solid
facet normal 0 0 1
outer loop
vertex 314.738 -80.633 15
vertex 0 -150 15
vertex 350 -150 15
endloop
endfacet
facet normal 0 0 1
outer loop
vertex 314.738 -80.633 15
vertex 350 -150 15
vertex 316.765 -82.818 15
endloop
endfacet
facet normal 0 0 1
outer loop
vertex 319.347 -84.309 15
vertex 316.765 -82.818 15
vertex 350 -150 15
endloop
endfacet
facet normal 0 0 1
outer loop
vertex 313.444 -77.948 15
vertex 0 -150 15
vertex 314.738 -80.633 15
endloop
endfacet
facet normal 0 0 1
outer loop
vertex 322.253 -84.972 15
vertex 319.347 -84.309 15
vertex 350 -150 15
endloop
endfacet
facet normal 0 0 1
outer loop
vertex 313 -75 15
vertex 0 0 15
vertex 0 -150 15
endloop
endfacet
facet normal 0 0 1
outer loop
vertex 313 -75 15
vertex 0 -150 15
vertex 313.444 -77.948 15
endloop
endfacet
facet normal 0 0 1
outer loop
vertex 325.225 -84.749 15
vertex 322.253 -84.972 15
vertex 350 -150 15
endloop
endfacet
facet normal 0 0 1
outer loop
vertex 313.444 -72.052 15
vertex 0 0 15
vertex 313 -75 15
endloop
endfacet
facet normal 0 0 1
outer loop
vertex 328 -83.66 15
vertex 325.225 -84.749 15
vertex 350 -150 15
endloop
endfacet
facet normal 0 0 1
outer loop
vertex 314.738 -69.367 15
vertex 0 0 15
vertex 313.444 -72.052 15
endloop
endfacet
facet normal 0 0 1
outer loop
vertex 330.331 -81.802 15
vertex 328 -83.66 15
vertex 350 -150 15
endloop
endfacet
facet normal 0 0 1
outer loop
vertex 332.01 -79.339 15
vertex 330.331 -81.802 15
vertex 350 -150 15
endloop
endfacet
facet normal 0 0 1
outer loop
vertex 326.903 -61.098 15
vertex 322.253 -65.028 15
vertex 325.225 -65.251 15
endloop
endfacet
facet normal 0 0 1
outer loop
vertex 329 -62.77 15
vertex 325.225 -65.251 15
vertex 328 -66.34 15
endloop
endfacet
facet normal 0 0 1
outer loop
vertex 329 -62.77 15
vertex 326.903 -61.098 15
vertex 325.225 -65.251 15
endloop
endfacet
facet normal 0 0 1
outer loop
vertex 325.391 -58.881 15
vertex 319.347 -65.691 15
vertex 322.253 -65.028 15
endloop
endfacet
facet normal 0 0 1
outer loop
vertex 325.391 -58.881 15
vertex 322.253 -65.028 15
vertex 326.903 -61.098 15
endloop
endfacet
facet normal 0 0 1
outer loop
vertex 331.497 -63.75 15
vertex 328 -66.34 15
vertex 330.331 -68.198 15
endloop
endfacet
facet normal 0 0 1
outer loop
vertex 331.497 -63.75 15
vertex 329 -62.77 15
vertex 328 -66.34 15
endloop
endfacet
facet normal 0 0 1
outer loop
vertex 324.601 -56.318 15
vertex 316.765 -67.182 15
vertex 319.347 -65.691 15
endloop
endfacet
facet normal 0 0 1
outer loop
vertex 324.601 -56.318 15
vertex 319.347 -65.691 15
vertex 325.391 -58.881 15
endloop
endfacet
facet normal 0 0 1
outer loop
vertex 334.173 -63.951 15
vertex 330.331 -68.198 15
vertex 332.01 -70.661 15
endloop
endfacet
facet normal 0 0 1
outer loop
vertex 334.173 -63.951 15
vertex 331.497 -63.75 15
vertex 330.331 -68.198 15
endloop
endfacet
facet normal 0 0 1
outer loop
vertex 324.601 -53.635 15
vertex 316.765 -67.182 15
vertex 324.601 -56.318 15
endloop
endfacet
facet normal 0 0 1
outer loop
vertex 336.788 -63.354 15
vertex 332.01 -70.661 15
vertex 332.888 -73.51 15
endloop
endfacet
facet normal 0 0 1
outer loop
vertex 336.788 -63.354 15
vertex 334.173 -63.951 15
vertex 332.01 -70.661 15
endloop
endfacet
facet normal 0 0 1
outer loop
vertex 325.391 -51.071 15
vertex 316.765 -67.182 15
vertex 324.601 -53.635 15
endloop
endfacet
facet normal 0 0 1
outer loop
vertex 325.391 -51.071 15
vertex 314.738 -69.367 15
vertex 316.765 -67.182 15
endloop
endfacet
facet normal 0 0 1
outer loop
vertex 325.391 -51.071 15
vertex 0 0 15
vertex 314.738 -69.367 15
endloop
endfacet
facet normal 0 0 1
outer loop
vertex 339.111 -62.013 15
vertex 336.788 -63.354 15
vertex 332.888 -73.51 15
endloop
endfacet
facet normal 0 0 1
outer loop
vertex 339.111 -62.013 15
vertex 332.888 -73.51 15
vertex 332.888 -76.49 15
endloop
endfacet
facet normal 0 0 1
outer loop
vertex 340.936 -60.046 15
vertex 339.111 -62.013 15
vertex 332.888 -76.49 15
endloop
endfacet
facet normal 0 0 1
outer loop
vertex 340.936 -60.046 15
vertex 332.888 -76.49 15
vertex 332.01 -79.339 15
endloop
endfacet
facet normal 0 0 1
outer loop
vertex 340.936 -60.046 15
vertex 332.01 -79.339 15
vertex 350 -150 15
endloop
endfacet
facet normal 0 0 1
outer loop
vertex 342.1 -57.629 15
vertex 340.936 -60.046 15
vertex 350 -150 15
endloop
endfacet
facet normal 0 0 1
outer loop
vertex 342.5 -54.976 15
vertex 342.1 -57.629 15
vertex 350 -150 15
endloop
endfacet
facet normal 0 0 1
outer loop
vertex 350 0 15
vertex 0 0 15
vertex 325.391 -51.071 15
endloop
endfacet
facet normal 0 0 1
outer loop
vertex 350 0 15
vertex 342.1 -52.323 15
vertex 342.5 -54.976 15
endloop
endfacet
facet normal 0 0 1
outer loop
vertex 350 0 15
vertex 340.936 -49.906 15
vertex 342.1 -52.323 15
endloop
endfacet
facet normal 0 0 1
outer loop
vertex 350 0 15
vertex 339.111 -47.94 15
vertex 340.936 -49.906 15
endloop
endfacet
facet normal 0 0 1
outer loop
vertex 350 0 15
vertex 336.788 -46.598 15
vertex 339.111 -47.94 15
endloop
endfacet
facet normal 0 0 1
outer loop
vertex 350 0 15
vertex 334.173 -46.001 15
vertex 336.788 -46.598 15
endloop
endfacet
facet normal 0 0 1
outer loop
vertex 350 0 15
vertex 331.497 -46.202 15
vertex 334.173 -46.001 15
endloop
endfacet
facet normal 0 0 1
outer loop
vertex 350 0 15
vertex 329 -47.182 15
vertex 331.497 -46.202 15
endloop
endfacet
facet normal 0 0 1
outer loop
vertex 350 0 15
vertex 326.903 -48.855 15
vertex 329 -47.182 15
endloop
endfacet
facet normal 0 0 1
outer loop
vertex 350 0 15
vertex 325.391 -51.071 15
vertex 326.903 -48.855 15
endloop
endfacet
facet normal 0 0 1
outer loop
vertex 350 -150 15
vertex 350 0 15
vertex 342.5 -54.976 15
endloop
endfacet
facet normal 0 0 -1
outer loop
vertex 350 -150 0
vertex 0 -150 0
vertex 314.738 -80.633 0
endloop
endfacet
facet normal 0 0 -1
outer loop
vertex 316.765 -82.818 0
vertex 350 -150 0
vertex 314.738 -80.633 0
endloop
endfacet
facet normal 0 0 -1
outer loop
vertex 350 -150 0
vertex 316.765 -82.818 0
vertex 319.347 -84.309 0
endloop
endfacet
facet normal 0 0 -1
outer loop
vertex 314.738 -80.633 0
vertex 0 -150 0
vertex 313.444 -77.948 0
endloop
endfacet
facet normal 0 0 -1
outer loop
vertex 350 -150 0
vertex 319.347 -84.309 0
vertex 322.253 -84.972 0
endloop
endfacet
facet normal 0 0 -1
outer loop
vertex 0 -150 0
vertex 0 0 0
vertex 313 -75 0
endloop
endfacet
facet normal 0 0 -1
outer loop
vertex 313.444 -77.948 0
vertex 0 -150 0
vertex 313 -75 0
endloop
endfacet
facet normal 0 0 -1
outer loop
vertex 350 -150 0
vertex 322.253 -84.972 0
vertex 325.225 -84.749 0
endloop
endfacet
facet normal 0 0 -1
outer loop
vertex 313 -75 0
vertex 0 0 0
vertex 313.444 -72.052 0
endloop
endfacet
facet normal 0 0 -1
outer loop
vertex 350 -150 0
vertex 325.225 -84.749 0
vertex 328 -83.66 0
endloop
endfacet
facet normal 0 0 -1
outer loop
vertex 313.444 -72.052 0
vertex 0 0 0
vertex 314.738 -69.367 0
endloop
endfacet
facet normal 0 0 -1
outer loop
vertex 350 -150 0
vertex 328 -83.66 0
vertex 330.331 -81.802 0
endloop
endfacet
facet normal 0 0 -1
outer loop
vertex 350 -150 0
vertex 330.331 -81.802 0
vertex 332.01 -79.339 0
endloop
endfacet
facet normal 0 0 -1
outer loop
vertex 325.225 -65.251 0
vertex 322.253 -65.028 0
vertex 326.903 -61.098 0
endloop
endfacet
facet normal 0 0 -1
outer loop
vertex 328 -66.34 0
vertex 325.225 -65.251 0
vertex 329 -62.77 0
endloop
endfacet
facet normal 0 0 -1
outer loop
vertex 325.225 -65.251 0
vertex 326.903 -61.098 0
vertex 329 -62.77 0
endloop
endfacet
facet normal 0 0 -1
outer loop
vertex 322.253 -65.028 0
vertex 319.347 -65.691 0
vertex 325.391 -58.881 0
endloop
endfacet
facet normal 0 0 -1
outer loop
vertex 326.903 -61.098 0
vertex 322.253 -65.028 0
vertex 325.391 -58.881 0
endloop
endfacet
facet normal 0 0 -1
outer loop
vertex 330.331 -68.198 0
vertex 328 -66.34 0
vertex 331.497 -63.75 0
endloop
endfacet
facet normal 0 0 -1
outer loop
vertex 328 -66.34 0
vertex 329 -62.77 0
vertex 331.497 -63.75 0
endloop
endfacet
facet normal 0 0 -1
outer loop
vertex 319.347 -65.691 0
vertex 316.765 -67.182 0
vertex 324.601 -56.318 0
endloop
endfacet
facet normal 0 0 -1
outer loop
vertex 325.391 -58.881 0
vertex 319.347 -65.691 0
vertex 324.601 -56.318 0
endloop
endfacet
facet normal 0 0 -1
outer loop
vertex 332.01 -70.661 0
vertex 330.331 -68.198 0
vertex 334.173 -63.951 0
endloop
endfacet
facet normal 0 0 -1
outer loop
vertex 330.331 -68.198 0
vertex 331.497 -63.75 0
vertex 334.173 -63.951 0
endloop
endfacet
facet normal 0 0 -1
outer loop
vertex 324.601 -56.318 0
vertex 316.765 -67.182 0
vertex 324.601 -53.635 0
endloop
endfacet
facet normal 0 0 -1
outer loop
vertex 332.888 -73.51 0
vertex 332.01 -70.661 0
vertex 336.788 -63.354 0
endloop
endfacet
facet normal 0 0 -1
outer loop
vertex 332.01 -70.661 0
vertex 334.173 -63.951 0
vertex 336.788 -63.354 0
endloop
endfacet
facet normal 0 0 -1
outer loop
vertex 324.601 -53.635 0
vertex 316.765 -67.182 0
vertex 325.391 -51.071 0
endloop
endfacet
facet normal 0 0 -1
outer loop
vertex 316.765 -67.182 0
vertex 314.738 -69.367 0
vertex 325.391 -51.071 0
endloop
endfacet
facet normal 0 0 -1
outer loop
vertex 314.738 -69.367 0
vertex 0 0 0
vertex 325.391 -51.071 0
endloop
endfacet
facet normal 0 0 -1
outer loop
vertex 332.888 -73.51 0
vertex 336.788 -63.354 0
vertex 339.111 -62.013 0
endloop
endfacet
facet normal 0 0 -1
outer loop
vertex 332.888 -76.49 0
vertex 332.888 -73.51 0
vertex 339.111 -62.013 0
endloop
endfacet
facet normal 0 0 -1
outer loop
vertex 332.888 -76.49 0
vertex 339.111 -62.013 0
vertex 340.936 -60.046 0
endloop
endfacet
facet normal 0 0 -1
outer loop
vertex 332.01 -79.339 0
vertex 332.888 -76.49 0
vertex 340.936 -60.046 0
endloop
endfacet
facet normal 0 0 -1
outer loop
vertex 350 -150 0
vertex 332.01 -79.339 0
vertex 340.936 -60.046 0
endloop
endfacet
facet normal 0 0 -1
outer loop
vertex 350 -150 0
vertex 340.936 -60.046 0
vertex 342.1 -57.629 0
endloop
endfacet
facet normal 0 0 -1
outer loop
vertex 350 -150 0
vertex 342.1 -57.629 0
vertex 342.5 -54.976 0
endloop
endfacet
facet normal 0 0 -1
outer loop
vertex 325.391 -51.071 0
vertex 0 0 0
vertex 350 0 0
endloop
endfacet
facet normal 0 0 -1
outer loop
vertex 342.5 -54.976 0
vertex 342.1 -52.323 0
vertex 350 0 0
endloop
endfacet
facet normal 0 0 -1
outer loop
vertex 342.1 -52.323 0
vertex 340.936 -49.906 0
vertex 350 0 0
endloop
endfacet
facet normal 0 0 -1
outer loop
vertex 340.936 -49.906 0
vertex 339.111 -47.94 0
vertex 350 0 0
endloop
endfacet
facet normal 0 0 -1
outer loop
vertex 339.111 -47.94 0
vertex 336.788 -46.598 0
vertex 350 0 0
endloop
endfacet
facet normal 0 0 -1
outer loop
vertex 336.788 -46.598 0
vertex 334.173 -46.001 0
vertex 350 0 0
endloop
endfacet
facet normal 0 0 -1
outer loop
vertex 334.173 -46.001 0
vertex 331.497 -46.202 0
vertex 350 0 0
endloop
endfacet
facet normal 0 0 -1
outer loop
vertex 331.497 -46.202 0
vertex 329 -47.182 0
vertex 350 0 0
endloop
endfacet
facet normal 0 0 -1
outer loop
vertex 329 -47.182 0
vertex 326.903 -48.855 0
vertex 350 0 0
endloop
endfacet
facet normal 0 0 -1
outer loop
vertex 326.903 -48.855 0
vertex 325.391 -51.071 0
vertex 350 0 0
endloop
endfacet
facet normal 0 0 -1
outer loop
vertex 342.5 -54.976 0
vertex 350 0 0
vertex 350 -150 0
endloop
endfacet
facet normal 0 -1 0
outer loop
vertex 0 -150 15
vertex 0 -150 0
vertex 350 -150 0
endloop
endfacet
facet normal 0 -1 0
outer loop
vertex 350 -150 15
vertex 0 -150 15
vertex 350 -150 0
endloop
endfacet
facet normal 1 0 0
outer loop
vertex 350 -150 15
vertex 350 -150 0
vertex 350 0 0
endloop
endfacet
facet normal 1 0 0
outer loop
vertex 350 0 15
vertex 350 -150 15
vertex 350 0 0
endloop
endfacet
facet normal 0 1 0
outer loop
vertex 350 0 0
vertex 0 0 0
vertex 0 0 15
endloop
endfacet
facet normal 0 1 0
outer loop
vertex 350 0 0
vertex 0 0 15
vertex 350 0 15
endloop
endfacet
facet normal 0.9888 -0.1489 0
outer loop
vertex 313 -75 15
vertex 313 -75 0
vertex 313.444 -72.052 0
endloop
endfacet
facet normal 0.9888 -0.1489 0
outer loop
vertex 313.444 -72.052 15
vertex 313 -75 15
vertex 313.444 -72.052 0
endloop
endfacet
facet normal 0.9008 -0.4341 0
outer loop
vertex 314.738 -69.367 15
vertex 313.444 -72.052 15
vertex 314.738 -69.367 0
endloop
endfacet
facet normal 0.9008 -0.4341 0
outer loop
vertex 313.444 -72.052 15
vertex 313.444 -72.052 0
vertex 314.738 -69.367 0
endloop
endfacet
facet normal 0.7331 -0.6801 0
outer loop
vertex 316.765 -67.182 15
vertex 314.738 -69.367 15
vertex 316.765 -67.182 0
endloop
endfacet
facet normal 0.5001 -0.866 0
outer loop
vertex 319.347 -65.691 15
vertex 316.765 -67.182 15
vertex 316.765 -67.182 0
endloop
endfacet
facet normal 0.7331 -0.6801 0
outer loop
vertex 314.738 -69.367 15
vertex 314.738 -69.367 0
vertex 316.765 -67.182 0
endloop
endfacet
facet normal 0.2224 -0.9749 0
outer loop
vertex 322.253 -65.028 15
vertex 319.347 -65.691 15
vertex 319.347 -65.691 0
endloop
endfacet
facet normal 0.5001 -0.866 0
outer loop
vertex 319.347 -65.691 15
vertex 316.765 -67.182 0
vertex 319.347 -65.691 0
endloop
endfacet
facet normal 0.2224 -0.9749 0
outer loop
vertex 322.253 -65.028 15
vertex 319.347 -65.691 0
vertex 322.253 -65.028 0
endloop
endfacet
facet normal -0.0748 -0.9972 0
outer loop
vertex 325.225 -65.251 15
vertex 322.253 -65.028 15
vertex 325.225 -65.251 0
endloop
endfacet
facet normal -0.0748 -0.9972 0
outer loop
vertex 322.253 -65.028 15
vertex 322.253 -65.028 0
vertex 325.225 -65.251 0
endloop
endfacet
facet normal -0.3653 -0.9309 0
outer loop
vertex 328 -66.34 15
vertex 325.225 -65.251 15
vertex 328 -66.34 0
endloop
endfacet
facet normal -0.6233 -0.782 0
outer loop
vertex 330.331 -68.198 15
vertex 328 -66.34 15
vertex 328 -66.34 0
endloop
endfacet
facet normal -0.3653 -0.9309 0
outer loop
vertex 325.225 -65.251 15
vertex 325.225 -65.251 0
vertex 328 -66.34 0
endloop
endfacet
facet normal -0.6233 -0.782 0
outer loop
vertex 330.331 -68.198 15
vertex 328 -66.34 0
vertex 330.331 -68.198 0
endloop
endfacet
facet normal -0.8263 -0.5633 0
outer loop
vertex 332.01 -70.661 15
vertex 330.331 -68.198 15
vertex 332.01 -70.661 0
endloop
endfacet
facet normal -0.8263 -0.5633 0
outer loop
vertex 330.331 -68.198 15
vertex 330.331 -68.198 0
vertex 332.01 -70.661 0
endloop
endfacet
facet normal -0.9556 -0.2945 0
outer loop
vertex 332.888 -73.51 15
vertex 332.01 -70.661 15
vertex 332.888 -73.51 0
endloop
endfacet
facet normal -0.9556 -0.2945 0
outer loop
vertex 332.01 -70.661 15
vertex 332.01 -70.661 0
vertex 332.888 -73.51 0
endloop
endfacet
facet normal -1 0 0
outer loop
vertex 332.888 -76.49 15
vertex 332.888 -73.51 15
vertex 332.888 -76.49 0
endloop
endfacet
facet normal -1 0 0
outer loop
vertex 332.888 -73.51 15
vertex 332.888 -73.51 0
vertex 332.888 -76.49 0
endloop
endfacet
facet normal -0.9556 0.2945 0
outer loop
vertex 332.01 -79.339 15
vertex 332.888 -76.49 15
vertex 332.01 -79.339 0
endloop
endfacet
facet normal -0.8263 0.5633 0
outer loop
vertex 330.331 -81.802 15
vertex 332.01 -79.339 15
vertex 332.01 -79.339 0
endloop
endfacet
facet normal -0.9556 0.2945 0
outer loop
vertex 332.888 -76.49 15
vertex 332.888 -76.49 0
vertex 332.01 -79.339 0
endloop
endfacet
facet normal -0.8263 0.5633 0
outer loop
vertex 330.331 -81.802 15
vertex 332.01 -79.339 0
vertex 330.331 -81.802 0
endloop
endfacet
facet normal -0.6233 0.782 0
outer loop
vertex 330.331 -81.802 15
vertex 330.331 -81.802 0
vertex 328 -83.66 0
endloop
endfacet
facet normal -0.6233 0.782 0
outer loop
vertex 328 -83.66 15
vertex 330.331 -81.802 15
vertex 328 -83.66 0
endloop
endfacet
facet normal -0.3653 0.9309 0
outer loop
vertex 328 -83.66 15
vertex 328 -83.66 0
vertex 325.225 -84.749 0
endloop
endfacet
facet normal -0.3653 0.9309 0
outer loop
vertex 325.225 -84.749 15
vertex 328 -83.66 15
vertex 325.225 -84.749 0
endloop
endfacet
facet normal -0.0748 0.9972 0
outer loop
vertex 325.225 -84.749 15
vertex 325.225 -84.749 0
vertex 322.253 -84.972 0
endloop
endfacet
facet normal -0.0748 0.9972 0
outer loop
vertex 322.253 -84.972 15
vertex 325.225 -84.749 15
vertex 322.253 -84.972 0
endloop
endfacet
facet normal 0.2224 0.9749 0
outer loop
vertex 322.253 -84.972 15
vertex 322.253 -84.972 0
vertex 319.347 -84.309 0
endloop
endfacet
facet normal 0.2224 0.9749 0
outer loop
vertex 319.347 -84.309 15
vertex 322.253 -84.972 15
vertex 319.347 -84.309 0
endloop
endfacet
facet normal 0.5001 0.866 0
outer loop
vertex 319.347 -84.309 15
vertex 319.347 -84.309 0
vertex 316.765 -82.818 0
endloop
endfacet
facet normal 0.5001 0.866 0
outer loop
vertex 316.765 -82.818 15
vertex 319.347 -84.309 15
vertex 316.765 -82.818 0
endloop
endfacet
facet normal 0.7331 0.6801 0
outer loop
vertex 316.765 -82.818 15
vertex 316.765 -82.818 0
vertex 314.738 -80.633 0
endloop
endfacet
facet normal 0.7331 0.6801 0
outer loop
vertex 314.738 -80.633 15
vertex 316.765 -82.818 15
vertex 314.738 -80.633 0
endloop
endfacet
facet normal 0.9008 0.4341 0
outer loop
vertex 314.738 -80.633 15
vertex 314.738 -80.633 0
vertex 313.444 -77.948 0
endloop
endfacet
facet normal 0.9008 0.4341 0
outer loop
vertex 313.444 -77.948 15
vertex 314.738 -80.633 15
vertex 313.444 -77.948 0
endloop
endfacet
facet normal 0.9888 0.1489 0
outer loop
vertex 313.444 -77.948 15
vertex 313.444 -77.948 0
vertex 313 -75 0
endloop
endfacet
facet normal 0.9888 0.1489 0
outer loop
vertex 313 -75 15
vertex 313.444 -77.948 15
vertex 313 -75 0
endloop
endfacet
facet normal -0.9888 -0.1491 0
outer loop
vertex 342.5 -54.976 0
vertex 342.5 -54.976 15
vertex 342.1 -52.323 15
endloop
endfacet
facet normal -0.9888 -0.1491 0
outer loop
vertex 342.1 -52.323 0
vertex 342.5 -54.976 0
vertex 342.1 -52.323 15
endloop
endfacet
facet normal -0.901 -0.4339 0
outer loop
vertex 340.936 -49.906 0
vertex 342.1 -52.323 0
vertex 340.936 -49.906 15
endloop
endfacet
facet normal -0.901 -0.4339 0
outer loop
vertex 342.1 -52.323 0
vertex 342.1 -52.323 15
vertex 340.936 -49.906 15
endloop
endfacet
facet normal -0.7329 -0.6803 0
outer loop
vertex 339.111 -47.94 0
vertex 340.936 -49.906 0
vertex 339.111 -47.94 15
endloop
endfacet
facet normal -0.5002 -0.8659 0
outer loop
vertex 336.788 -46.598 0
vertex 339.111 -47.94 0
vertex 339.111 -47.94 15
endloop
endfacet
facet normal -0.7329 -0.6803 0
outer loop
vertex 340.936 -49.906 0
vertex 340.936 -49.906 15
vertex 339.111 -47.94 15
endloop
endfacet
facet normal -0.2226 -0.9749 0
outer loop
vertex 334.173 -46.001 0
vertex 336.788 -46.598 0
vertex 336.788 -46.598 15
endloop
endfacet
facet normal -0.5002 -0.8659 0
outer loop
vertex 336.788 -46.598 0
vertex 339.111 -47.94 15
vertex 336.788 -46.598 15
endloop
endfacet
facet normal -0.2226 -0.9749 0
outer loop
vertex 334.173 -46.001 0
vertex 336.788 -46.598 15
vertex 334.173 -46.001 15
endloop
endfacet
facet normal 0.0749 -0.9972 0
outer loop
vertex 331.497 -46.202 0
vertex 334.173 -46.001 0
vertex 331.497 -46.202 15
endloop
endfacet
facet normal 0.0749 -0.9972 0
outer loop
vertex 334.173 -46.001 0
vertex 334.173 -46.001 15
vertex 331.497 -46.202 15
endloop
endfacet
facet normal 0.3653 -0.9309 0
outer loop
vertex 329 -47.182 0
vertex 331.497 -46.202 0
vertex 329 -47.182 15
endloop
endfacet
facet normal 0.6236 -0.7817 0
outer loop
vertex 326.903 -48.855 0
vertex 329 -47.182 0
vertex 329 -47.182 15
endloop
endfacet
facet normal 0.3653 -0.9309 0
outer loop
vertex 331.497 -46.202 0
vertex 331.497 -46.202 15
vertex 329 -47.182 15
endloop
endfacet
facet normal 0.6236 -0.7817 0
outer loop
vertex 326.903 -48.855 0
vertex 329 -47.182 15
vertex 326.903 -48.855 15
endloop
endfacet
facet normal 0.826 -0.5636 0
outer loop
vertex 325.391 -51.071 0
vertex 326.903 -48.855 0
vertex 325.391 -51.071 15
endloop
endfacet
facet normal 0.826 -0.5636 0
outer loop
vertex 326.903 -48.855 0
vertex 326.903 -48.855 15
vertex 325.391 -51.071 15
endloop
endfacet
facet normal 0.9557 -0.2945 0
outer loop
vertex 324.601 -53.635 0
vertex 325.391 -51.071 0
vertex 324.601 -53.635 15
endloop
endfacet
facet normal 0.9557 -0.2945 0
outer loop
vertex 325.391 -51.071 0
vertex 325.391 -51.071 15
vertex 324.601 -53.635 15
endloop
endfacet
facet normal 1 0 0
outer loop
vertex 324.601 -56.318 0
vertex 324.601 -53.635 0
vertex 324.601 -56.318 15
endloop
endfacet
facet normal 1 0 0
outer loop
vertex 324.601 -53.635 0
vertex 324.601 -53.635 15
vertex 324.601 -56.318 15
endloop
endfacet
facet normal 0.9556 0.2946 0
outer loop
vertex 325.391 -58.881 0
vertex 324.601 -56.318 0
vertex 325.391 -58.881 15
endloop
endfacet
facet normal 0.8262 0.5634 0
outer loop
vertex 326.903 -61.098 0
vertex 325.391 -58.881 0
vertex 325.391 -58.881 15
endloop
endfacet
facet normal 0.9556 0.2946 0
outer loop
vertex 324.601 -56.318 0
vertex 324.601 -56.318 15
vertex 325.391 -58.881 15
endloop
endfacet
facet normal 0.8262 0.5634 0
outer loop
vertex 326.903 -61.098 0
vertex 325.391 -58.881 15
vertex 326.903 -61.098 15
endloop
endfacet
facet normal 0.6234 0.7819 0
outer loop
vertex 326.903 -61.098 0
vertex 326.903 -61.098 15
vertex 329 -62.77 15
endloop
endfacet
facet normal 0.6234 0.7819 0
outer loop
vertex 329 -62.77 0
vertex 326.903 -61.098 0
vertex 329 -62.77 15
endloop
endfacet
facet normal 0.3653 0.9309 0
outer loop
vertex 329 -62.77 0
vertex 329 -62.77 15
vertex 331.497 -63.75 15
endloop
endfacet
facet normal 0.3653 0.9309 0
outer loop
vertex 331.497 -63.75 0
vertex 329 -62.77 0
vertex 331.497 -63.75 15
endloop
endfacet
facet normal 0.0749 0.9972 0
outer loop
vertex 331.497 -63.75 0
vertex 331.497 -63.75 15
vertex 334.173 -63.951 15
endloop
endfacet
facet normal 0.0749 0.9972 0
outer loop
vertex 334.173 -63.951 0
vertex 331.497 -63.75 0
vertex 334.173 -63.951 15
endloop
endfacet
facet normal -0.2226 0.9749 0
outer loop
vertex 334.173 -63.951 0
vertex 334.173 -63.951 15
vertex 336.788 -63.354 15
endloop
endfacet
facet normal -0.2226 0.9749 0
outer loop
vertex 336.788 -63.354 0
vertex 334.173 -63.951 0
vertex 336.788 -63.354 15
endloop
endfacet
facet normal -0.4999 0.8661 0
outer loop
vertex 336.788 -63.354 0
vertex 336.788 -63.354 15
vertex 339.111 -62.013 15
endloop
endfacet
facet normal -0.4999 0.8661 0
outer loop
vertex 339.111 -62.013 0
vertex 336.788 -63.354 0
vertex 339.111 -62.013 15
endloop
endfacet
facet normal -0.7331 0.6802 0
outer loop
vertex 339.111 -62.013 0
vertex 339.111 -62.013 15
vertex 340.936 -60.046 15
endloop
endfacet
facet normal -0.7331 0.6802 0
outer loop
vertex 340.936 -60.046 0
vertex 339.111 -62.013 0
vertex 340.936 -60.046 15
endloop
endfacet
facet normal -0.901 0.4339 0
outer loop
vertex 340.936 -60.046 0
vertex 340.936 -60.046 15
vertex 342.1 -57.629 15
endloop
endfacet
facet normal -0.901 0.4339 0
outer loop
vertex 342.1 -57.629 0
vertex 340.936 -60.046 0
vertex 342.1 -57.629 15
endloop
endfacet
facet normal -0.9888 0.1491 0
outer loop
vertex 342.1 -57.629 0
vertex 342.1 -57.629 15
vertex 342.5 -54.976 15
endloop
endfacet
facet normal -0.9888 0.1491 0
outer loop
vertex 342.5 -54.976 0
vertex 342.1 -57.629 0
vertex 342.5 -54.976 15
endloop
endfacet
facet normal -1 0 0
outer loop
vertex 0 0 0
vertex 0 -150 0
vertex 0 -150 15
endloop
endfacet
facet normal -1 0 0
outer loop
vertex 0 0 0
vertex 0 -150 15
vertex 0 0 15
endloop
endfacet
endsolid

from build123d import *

# Parameters (mm, degrees)
ESQUISSE1_W             = 350
ESQUISSE1_H             = 150
BOSS_EXTRU_1_DEPTH      = 15
ESQUISSE2_R             = 10
ENL_V_MAT_EXTRU_2_DEPTH = 382.083980246
ESQUISSE3_R             = 9
ENL_V_MAT_EXTRU_3_DEPTH = 20


with BuildPart() as part:
    # Esquisse1 → Boss.-Extru.1 (new body)
    with BuildSketch(Plane.XY):
        with Locations((175, -75)):
            Rectangle(ESQUISSE1_W, ESQUISSE1_H)
    extrude(amount=BOSS_EXTRU_1_DEPTH)

    # Esquisse2 → Enlèv. mat.-Extru.2 (cut, through all)
    with BuildSketch(Plane(origin=(0, 0, 0), x_dir=(-1, 0, 0), z_dir=(0, 0, -1))):
        with Locations((-323, -75)):
            Circle(ESQUISSE2_R)
    extrude(amount=-ENL_V_MAT_EXTRU_2_DEPTH, mode=Mode.SUBTRACT)

    # Esquisse3 → Enlèv. mat.-Extru.3 (cut)
    with BuildSketch(Plane.XY.offset(15)):
        with Locations((333.5, -54.976135627)):
            Circle(ESQUISSE3_R)
    extrude(amount=-ENL_V_MAT_EXTRU_3_DEPTH, mode=Mode.SUBTRACT)


solid = part.part
